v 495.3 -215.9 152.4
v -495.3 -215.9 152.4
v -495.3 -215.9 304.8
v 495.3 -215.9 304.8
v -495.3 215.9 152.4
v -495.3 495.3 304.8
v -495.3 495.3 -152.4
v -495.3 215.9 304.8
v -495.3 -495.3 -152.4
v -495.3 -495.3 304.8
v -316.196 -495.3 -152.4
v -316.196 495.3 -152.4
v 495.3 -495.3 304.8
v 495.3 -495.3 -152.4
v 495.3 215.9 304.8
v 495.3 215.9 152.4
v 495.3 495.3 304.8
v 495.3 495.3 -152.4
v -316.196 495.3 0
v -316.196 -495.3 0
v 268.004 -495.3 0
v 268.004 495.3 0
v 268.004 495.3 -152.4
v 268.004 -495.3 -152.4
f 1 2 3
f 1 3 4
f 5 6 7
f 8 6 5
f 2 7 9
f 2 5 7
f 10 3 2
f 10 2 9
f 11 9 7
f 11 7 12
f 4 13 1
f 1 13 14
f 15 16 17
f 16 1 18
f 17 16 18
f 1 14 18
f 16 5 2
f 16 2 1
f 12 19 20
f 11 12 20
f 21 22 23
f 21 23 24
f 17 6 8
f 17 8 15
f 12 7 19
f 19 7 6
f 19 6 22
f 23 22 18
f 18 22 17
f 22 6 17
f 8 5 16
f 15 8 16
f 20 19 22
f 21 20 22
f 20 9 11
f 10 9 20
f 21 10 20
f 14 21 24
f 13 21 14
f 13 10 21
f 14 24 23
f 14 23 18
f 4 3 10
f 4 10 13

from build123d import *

# Parameters (mm, degrees)
F0_W     = 990.6
F0_H     = 990.6
F1_DEPTH = 152.4
F2_W     = 990.6
F2_H     = 279.4
F3_DEPTH = 152.4
F4_W     = 179.104452
F4_H     = 990.6
F4_W_2   = 227.295548
F5_DEPTH = 152.4


with BuildPart() as f1:
    # F0 (on Top) → F1 (new body)
    with BuildSketch(Plane.XY):
        Rectangle(F0_W, F0_H)
    extrude(amount=F1_DEPTH)

    # F2 (on face) → F3 (join)
    with BuildSketch(Plane.XY.offset(152.4)):
        with Locations((0, 355.6)):
            Rectangle(F2_W, F2_H)
        with Locations((0, -355.6)):
            Rectangle(F2_W, F2_H)
    extrude(amount=F3_DEPTH)

    # F4 (on face) → F5 (join)
    with BuildSketch(Plane(origin=(0, 0, 0), x_dir=(1, 0, 0), z_dir=(0, 0, -1))):
        with Locations((-405.747774, 0)):
            Rectangle(F4_W, F4_H)
        with Locations((381.652226, 0)):
            Rectangle(F4_W_2, F4_H)
    extrude(amount=F5_DEPTH)


solid = f1.part
